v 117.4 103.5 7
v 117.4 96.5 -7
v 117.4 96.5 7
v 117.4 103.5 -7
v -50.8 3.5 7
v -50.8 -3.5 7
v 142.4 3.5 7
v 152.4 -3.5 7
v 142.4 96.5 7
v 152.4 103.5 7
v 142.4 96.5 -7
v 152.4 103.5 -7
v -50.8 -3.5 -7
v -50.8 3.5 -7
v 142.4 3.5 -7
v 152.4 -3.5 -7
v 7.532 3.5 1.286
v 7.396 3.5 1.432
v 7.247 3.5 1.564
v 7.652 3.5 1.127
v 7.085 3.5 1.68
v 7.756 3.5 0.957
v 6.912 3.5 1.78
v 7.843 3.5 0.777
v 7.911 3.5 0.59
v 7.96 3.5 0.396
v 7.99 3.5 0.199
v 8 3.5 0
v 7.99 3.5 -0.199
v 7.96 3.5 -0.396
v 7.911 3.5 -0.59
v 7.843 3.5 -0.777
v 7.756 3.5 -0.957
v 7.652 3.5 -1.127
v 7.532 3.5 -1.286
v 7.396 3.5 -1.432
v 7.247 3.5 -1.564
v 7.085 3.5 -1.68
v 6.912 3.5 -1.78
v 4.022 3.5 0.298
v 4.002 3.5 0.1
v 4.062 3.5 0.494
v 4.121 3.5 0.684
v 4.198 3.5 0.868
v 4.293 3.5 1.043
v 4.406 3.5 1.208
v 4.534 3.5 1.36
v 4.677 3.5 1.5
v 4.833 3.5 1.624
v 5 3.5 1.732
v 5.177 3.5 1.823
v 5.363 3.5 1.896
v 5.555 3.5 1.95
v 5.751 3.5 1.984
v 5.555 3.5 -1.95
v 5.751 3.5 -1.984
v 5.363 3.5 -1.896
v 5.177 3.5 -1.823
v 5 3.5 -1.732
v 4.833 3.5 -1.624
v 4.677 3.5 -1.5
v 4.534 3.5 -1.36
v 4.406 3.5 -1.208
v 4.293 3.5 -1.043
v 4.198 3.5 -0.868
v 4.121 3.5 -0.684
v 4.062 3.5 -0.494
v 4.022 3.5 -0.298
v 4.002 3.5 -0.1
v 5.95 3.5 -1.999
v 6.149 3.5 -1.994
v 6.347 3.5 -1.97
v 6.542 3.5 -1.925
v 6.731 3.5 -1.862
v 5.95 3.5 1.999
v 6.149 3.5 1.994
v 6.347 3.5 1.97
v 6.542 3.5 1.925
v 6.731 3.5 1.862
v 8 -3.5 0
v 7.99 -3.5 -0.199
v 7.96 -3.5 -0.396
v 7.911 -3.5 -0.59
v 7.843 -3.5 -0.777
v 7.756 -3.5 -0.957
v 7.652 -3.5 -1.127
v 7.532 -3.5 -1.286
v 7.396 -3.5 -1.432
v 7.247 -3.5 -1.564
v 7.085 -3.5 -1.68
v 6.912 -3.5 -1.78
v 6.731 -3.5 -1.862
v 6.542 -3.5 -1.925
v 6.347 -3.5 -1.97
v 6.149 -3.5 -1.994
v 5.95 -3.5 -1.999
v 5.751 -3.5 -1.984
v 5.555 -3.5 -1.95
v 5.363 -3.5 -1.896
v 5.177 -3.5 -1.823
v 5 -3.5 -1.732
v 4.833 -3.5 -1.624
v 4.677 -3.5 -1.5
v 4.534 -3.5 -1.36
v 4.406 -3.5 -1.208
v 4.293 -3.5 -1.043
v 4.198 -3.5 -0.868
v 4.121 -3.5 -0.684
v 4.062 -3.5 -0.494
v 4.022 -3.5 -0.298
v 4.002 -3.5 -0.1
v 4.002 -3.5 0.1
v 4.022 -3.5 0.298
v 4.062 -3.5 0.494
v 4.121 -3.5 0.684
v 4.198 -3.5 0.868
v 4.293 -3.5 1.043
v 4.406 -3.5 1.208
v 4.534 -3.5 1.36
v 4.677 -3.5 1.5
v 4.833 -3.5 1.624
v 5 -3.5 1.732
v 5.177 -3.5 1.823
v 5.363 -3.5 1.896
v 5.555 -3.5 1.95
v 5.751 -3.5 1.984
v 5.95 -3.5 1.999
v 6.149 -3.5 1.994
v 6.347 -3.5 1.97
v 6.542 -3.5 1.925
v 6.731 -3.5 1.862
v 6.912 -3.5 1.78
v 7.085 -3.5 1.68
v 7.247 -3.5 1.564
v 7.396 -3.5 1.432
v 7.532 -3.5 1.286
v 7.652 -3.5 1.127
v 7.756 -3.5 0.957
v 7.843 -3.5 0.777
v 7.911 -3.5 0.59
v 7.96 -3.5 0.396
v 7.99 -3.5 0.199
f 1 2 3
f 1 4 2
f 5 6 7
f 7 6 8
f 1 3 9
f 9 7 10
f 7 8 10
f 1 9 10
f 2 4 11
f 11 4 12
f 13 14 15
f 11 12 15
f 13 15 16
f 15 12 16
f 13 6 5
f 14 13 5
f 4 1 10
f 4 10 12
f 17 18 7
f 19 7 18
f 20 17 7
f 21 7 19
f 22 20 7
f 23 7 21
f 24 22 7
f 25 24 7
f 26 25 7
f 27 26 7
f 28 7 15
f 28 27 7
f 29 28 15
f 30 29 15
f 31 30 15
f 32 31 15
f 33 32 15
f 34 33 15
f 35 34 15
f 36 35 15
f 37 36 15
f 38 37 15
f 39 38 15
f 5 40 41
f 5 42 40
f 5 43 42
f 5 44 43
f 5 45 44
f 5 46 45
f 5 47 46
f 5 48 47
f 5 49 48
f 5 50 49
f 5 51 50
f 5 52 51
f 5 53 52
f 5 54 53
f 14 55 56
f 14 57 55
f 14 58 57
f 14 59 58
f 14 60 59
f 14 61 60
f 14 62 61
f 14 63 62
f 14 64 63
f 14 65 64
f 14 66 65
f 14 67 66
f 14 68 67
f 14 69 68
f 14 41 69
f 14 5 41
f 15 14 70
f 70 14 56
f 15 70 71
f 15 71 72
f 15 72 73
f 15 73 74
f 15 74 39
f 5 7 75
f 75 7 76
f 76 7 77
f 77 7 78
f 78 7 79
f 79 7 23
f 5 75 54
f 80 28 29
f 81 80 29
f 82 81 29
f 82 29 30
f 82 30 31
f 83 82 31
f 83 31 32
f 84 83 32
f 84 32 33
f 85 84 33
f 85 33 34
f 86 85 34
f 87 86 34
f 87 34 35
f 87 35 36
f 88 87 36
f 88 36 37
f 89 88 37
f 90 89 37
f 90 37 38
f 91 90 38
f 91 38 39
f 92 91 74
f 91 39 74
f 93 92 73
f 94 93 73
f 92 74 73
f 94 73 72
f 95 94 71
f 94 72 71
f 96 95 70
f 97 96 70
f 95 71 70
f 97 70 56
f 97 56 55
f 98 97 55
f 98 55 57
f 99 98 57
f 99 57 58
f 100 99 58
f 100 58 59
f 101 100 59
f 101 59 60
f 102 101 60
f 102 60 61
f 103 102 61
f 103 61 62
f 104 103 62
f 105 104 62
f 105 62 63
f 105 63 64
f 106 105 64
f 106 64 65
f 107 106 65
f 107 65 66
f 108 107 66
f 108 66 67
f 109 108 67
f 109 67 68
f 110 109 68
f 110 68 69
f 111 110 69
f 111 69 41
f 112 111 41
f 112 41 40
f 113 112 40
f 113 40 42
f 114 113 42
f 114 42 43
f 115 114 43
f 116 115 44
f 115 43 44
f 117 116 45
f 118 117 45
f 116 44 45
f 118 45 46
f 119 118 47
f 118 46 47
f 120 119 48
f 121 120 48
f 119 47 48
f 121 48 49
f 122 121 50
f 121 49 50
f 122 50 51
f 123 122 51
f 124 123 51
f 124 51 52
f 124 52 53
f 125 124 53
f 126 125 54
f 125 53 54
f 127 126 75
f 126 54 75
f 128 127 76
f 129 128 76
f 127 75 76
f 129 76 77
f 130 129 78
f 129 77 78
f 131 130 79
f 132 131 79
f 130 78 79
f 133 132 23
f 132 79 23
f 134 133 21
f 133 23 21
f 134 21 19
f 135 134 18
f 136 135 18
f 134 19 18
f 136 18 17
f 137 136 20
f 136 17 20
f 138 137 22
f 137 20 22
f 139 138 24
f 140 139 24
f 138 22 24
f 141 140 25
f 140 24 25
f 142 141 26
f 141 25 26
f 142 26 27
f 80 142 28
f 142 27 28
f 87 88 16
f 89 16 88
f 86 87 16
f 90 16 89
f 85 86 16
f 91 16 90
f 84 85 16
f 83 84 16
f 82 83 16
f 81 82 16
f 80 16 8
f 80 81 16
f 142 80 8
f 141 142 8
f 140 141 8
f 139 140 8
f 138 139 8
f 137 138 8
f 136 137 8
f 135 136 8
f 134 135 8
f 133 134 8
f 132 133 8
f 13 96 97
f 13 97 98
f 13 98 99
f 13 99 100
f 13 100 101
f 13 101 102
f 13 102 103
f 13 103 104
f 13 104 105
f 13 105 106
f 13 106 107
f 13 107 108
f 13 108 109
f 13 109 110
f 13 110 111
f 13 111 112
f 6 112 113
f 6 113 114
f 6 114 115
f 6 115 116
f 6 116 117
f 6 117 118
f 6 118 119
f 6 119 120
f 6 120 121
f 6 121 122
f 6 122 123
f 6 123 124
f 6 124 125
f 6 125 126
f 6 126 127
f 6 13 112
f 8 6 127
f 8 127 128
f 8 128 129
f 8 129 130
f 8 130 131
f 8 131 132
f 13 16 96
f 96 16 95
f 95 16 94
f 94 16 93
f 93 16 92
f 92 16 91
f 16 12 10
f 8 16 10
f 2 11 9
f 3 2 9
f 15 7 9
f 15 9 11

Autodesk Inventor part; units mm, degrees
ref_plane "YZ Plane" through (0, 0, 0) normal (1, 0, 0) x (0, 1, 0)
ref_plane "XZ Plane" through (0, 0, 0) normal (0, 1, 0) x (-1, 0, 0)
ref_plane "XY Plane" through (0, 0, 0) normal (0, 0, 1) x (1, 0, 0)
sketch "Sketch1" plane through (0, 0, 0) normal (1, 0, 0) x (0, 1, 0)
  line L0 (3.5, -7) -> (-3.5, -7)
  line L1 (-3.5, -7) -> (-3.5, 7)
  line L2 (-3.5, 7) -> (3.5, 7)
  line L3 (3.5, 7) -> (3.5, -7)
  line L4 (3.5, -7) -> (-3.5, 7) construction
  line L5 (-3.5, -7) -> (3.5, 7) construction
  point P0 (0, 0)
  dimension "d0" = 7
  dimension "d1" = 14
extrude "Extrusion1" add sketch "Sketch1" along normal blind 152.4 and the other way blind 50.8
sketch "Sketch2" plane through (-50.8, 3.5, 7) normal (0, 1, 0) x (1, 0, 0)
  circle A0 centre (56.8, 7) radius 2
  point P0 (50.8, 7)
  dimension "d4" = 4
  dimension "d5" = 6
extrude "Extrusion2" cut sketch "Sketch2" against normal through all
sketch "Sketch3" plane through (-50.8, 3.5, 7) normal (0, 1, 0) x (1, 0, 0)
  line L0 (203.2, 0) -> (193.2, 0)
  line L1 (193.2, 0) -> (193.2, 14)
  line L2 (193.2, 14) -> (203.2, 14)
  line L3 (203.2, 14) -> (203.2, 0)
  line L4 (203.2, 0) -> (0, 0) projected
  line L5 (203.2, 14) -> (203.2, 0) projected
  point P0 (50.8, 7)
  dimension "d8" = 10
  dimension "d9" = 14
  dimension "d10" = 0
  dimension "d11" = 0
extrude "Extrusion3" add sketch "Sketch3" along normal blind 100
sketch "Sketch5" plane through (142.4, 3.5, -7) normal (-1, 0, 0) x (0, 0, 1)
  line L0 (14, 100) -> (0, 100)
  line L1 (0, 100) -> (0, 93)
  line L2 (0, 93) -> (14, 93)
  line L3 (14, 93) -> (14, 100)
  line L4 (14, 0) -> (14, 100) projected
  line L5 (0, 100) -> (14, 100) projected
  point P0 (7, -3.5)
  dimension "d17" = 14
  dimension "d18" = 7
  dimension "d19" = 0
  dimension "d20" = 0
extrude "Extrusion4" add sketch "Sketch5" along normal blind 25
sketch "Sketch10" plane through (-50.8, 3.5, 7) normal (0, 1, 0) x (1, 0, 0)
  point P0 (50.8, 7)
sketch "Sketch11" plane through (-50.8, 0, 0) normal (-1, 0, 0) x (0, 0, 1)
  point P0 (0, 0)
sketch "Sketch12" plane through (152.4, 0, 0) normal (1, 0, 0) x (0, 0, -1)
  point P0 (0, 0)
sketch "Sketch13" plane through (-50.8, 103.5, 7) normal (0, 1, 0) x (1, 0, 0)
  point P0 (50.8, 7)
properties part number "handle" material "PBT Plastic"
